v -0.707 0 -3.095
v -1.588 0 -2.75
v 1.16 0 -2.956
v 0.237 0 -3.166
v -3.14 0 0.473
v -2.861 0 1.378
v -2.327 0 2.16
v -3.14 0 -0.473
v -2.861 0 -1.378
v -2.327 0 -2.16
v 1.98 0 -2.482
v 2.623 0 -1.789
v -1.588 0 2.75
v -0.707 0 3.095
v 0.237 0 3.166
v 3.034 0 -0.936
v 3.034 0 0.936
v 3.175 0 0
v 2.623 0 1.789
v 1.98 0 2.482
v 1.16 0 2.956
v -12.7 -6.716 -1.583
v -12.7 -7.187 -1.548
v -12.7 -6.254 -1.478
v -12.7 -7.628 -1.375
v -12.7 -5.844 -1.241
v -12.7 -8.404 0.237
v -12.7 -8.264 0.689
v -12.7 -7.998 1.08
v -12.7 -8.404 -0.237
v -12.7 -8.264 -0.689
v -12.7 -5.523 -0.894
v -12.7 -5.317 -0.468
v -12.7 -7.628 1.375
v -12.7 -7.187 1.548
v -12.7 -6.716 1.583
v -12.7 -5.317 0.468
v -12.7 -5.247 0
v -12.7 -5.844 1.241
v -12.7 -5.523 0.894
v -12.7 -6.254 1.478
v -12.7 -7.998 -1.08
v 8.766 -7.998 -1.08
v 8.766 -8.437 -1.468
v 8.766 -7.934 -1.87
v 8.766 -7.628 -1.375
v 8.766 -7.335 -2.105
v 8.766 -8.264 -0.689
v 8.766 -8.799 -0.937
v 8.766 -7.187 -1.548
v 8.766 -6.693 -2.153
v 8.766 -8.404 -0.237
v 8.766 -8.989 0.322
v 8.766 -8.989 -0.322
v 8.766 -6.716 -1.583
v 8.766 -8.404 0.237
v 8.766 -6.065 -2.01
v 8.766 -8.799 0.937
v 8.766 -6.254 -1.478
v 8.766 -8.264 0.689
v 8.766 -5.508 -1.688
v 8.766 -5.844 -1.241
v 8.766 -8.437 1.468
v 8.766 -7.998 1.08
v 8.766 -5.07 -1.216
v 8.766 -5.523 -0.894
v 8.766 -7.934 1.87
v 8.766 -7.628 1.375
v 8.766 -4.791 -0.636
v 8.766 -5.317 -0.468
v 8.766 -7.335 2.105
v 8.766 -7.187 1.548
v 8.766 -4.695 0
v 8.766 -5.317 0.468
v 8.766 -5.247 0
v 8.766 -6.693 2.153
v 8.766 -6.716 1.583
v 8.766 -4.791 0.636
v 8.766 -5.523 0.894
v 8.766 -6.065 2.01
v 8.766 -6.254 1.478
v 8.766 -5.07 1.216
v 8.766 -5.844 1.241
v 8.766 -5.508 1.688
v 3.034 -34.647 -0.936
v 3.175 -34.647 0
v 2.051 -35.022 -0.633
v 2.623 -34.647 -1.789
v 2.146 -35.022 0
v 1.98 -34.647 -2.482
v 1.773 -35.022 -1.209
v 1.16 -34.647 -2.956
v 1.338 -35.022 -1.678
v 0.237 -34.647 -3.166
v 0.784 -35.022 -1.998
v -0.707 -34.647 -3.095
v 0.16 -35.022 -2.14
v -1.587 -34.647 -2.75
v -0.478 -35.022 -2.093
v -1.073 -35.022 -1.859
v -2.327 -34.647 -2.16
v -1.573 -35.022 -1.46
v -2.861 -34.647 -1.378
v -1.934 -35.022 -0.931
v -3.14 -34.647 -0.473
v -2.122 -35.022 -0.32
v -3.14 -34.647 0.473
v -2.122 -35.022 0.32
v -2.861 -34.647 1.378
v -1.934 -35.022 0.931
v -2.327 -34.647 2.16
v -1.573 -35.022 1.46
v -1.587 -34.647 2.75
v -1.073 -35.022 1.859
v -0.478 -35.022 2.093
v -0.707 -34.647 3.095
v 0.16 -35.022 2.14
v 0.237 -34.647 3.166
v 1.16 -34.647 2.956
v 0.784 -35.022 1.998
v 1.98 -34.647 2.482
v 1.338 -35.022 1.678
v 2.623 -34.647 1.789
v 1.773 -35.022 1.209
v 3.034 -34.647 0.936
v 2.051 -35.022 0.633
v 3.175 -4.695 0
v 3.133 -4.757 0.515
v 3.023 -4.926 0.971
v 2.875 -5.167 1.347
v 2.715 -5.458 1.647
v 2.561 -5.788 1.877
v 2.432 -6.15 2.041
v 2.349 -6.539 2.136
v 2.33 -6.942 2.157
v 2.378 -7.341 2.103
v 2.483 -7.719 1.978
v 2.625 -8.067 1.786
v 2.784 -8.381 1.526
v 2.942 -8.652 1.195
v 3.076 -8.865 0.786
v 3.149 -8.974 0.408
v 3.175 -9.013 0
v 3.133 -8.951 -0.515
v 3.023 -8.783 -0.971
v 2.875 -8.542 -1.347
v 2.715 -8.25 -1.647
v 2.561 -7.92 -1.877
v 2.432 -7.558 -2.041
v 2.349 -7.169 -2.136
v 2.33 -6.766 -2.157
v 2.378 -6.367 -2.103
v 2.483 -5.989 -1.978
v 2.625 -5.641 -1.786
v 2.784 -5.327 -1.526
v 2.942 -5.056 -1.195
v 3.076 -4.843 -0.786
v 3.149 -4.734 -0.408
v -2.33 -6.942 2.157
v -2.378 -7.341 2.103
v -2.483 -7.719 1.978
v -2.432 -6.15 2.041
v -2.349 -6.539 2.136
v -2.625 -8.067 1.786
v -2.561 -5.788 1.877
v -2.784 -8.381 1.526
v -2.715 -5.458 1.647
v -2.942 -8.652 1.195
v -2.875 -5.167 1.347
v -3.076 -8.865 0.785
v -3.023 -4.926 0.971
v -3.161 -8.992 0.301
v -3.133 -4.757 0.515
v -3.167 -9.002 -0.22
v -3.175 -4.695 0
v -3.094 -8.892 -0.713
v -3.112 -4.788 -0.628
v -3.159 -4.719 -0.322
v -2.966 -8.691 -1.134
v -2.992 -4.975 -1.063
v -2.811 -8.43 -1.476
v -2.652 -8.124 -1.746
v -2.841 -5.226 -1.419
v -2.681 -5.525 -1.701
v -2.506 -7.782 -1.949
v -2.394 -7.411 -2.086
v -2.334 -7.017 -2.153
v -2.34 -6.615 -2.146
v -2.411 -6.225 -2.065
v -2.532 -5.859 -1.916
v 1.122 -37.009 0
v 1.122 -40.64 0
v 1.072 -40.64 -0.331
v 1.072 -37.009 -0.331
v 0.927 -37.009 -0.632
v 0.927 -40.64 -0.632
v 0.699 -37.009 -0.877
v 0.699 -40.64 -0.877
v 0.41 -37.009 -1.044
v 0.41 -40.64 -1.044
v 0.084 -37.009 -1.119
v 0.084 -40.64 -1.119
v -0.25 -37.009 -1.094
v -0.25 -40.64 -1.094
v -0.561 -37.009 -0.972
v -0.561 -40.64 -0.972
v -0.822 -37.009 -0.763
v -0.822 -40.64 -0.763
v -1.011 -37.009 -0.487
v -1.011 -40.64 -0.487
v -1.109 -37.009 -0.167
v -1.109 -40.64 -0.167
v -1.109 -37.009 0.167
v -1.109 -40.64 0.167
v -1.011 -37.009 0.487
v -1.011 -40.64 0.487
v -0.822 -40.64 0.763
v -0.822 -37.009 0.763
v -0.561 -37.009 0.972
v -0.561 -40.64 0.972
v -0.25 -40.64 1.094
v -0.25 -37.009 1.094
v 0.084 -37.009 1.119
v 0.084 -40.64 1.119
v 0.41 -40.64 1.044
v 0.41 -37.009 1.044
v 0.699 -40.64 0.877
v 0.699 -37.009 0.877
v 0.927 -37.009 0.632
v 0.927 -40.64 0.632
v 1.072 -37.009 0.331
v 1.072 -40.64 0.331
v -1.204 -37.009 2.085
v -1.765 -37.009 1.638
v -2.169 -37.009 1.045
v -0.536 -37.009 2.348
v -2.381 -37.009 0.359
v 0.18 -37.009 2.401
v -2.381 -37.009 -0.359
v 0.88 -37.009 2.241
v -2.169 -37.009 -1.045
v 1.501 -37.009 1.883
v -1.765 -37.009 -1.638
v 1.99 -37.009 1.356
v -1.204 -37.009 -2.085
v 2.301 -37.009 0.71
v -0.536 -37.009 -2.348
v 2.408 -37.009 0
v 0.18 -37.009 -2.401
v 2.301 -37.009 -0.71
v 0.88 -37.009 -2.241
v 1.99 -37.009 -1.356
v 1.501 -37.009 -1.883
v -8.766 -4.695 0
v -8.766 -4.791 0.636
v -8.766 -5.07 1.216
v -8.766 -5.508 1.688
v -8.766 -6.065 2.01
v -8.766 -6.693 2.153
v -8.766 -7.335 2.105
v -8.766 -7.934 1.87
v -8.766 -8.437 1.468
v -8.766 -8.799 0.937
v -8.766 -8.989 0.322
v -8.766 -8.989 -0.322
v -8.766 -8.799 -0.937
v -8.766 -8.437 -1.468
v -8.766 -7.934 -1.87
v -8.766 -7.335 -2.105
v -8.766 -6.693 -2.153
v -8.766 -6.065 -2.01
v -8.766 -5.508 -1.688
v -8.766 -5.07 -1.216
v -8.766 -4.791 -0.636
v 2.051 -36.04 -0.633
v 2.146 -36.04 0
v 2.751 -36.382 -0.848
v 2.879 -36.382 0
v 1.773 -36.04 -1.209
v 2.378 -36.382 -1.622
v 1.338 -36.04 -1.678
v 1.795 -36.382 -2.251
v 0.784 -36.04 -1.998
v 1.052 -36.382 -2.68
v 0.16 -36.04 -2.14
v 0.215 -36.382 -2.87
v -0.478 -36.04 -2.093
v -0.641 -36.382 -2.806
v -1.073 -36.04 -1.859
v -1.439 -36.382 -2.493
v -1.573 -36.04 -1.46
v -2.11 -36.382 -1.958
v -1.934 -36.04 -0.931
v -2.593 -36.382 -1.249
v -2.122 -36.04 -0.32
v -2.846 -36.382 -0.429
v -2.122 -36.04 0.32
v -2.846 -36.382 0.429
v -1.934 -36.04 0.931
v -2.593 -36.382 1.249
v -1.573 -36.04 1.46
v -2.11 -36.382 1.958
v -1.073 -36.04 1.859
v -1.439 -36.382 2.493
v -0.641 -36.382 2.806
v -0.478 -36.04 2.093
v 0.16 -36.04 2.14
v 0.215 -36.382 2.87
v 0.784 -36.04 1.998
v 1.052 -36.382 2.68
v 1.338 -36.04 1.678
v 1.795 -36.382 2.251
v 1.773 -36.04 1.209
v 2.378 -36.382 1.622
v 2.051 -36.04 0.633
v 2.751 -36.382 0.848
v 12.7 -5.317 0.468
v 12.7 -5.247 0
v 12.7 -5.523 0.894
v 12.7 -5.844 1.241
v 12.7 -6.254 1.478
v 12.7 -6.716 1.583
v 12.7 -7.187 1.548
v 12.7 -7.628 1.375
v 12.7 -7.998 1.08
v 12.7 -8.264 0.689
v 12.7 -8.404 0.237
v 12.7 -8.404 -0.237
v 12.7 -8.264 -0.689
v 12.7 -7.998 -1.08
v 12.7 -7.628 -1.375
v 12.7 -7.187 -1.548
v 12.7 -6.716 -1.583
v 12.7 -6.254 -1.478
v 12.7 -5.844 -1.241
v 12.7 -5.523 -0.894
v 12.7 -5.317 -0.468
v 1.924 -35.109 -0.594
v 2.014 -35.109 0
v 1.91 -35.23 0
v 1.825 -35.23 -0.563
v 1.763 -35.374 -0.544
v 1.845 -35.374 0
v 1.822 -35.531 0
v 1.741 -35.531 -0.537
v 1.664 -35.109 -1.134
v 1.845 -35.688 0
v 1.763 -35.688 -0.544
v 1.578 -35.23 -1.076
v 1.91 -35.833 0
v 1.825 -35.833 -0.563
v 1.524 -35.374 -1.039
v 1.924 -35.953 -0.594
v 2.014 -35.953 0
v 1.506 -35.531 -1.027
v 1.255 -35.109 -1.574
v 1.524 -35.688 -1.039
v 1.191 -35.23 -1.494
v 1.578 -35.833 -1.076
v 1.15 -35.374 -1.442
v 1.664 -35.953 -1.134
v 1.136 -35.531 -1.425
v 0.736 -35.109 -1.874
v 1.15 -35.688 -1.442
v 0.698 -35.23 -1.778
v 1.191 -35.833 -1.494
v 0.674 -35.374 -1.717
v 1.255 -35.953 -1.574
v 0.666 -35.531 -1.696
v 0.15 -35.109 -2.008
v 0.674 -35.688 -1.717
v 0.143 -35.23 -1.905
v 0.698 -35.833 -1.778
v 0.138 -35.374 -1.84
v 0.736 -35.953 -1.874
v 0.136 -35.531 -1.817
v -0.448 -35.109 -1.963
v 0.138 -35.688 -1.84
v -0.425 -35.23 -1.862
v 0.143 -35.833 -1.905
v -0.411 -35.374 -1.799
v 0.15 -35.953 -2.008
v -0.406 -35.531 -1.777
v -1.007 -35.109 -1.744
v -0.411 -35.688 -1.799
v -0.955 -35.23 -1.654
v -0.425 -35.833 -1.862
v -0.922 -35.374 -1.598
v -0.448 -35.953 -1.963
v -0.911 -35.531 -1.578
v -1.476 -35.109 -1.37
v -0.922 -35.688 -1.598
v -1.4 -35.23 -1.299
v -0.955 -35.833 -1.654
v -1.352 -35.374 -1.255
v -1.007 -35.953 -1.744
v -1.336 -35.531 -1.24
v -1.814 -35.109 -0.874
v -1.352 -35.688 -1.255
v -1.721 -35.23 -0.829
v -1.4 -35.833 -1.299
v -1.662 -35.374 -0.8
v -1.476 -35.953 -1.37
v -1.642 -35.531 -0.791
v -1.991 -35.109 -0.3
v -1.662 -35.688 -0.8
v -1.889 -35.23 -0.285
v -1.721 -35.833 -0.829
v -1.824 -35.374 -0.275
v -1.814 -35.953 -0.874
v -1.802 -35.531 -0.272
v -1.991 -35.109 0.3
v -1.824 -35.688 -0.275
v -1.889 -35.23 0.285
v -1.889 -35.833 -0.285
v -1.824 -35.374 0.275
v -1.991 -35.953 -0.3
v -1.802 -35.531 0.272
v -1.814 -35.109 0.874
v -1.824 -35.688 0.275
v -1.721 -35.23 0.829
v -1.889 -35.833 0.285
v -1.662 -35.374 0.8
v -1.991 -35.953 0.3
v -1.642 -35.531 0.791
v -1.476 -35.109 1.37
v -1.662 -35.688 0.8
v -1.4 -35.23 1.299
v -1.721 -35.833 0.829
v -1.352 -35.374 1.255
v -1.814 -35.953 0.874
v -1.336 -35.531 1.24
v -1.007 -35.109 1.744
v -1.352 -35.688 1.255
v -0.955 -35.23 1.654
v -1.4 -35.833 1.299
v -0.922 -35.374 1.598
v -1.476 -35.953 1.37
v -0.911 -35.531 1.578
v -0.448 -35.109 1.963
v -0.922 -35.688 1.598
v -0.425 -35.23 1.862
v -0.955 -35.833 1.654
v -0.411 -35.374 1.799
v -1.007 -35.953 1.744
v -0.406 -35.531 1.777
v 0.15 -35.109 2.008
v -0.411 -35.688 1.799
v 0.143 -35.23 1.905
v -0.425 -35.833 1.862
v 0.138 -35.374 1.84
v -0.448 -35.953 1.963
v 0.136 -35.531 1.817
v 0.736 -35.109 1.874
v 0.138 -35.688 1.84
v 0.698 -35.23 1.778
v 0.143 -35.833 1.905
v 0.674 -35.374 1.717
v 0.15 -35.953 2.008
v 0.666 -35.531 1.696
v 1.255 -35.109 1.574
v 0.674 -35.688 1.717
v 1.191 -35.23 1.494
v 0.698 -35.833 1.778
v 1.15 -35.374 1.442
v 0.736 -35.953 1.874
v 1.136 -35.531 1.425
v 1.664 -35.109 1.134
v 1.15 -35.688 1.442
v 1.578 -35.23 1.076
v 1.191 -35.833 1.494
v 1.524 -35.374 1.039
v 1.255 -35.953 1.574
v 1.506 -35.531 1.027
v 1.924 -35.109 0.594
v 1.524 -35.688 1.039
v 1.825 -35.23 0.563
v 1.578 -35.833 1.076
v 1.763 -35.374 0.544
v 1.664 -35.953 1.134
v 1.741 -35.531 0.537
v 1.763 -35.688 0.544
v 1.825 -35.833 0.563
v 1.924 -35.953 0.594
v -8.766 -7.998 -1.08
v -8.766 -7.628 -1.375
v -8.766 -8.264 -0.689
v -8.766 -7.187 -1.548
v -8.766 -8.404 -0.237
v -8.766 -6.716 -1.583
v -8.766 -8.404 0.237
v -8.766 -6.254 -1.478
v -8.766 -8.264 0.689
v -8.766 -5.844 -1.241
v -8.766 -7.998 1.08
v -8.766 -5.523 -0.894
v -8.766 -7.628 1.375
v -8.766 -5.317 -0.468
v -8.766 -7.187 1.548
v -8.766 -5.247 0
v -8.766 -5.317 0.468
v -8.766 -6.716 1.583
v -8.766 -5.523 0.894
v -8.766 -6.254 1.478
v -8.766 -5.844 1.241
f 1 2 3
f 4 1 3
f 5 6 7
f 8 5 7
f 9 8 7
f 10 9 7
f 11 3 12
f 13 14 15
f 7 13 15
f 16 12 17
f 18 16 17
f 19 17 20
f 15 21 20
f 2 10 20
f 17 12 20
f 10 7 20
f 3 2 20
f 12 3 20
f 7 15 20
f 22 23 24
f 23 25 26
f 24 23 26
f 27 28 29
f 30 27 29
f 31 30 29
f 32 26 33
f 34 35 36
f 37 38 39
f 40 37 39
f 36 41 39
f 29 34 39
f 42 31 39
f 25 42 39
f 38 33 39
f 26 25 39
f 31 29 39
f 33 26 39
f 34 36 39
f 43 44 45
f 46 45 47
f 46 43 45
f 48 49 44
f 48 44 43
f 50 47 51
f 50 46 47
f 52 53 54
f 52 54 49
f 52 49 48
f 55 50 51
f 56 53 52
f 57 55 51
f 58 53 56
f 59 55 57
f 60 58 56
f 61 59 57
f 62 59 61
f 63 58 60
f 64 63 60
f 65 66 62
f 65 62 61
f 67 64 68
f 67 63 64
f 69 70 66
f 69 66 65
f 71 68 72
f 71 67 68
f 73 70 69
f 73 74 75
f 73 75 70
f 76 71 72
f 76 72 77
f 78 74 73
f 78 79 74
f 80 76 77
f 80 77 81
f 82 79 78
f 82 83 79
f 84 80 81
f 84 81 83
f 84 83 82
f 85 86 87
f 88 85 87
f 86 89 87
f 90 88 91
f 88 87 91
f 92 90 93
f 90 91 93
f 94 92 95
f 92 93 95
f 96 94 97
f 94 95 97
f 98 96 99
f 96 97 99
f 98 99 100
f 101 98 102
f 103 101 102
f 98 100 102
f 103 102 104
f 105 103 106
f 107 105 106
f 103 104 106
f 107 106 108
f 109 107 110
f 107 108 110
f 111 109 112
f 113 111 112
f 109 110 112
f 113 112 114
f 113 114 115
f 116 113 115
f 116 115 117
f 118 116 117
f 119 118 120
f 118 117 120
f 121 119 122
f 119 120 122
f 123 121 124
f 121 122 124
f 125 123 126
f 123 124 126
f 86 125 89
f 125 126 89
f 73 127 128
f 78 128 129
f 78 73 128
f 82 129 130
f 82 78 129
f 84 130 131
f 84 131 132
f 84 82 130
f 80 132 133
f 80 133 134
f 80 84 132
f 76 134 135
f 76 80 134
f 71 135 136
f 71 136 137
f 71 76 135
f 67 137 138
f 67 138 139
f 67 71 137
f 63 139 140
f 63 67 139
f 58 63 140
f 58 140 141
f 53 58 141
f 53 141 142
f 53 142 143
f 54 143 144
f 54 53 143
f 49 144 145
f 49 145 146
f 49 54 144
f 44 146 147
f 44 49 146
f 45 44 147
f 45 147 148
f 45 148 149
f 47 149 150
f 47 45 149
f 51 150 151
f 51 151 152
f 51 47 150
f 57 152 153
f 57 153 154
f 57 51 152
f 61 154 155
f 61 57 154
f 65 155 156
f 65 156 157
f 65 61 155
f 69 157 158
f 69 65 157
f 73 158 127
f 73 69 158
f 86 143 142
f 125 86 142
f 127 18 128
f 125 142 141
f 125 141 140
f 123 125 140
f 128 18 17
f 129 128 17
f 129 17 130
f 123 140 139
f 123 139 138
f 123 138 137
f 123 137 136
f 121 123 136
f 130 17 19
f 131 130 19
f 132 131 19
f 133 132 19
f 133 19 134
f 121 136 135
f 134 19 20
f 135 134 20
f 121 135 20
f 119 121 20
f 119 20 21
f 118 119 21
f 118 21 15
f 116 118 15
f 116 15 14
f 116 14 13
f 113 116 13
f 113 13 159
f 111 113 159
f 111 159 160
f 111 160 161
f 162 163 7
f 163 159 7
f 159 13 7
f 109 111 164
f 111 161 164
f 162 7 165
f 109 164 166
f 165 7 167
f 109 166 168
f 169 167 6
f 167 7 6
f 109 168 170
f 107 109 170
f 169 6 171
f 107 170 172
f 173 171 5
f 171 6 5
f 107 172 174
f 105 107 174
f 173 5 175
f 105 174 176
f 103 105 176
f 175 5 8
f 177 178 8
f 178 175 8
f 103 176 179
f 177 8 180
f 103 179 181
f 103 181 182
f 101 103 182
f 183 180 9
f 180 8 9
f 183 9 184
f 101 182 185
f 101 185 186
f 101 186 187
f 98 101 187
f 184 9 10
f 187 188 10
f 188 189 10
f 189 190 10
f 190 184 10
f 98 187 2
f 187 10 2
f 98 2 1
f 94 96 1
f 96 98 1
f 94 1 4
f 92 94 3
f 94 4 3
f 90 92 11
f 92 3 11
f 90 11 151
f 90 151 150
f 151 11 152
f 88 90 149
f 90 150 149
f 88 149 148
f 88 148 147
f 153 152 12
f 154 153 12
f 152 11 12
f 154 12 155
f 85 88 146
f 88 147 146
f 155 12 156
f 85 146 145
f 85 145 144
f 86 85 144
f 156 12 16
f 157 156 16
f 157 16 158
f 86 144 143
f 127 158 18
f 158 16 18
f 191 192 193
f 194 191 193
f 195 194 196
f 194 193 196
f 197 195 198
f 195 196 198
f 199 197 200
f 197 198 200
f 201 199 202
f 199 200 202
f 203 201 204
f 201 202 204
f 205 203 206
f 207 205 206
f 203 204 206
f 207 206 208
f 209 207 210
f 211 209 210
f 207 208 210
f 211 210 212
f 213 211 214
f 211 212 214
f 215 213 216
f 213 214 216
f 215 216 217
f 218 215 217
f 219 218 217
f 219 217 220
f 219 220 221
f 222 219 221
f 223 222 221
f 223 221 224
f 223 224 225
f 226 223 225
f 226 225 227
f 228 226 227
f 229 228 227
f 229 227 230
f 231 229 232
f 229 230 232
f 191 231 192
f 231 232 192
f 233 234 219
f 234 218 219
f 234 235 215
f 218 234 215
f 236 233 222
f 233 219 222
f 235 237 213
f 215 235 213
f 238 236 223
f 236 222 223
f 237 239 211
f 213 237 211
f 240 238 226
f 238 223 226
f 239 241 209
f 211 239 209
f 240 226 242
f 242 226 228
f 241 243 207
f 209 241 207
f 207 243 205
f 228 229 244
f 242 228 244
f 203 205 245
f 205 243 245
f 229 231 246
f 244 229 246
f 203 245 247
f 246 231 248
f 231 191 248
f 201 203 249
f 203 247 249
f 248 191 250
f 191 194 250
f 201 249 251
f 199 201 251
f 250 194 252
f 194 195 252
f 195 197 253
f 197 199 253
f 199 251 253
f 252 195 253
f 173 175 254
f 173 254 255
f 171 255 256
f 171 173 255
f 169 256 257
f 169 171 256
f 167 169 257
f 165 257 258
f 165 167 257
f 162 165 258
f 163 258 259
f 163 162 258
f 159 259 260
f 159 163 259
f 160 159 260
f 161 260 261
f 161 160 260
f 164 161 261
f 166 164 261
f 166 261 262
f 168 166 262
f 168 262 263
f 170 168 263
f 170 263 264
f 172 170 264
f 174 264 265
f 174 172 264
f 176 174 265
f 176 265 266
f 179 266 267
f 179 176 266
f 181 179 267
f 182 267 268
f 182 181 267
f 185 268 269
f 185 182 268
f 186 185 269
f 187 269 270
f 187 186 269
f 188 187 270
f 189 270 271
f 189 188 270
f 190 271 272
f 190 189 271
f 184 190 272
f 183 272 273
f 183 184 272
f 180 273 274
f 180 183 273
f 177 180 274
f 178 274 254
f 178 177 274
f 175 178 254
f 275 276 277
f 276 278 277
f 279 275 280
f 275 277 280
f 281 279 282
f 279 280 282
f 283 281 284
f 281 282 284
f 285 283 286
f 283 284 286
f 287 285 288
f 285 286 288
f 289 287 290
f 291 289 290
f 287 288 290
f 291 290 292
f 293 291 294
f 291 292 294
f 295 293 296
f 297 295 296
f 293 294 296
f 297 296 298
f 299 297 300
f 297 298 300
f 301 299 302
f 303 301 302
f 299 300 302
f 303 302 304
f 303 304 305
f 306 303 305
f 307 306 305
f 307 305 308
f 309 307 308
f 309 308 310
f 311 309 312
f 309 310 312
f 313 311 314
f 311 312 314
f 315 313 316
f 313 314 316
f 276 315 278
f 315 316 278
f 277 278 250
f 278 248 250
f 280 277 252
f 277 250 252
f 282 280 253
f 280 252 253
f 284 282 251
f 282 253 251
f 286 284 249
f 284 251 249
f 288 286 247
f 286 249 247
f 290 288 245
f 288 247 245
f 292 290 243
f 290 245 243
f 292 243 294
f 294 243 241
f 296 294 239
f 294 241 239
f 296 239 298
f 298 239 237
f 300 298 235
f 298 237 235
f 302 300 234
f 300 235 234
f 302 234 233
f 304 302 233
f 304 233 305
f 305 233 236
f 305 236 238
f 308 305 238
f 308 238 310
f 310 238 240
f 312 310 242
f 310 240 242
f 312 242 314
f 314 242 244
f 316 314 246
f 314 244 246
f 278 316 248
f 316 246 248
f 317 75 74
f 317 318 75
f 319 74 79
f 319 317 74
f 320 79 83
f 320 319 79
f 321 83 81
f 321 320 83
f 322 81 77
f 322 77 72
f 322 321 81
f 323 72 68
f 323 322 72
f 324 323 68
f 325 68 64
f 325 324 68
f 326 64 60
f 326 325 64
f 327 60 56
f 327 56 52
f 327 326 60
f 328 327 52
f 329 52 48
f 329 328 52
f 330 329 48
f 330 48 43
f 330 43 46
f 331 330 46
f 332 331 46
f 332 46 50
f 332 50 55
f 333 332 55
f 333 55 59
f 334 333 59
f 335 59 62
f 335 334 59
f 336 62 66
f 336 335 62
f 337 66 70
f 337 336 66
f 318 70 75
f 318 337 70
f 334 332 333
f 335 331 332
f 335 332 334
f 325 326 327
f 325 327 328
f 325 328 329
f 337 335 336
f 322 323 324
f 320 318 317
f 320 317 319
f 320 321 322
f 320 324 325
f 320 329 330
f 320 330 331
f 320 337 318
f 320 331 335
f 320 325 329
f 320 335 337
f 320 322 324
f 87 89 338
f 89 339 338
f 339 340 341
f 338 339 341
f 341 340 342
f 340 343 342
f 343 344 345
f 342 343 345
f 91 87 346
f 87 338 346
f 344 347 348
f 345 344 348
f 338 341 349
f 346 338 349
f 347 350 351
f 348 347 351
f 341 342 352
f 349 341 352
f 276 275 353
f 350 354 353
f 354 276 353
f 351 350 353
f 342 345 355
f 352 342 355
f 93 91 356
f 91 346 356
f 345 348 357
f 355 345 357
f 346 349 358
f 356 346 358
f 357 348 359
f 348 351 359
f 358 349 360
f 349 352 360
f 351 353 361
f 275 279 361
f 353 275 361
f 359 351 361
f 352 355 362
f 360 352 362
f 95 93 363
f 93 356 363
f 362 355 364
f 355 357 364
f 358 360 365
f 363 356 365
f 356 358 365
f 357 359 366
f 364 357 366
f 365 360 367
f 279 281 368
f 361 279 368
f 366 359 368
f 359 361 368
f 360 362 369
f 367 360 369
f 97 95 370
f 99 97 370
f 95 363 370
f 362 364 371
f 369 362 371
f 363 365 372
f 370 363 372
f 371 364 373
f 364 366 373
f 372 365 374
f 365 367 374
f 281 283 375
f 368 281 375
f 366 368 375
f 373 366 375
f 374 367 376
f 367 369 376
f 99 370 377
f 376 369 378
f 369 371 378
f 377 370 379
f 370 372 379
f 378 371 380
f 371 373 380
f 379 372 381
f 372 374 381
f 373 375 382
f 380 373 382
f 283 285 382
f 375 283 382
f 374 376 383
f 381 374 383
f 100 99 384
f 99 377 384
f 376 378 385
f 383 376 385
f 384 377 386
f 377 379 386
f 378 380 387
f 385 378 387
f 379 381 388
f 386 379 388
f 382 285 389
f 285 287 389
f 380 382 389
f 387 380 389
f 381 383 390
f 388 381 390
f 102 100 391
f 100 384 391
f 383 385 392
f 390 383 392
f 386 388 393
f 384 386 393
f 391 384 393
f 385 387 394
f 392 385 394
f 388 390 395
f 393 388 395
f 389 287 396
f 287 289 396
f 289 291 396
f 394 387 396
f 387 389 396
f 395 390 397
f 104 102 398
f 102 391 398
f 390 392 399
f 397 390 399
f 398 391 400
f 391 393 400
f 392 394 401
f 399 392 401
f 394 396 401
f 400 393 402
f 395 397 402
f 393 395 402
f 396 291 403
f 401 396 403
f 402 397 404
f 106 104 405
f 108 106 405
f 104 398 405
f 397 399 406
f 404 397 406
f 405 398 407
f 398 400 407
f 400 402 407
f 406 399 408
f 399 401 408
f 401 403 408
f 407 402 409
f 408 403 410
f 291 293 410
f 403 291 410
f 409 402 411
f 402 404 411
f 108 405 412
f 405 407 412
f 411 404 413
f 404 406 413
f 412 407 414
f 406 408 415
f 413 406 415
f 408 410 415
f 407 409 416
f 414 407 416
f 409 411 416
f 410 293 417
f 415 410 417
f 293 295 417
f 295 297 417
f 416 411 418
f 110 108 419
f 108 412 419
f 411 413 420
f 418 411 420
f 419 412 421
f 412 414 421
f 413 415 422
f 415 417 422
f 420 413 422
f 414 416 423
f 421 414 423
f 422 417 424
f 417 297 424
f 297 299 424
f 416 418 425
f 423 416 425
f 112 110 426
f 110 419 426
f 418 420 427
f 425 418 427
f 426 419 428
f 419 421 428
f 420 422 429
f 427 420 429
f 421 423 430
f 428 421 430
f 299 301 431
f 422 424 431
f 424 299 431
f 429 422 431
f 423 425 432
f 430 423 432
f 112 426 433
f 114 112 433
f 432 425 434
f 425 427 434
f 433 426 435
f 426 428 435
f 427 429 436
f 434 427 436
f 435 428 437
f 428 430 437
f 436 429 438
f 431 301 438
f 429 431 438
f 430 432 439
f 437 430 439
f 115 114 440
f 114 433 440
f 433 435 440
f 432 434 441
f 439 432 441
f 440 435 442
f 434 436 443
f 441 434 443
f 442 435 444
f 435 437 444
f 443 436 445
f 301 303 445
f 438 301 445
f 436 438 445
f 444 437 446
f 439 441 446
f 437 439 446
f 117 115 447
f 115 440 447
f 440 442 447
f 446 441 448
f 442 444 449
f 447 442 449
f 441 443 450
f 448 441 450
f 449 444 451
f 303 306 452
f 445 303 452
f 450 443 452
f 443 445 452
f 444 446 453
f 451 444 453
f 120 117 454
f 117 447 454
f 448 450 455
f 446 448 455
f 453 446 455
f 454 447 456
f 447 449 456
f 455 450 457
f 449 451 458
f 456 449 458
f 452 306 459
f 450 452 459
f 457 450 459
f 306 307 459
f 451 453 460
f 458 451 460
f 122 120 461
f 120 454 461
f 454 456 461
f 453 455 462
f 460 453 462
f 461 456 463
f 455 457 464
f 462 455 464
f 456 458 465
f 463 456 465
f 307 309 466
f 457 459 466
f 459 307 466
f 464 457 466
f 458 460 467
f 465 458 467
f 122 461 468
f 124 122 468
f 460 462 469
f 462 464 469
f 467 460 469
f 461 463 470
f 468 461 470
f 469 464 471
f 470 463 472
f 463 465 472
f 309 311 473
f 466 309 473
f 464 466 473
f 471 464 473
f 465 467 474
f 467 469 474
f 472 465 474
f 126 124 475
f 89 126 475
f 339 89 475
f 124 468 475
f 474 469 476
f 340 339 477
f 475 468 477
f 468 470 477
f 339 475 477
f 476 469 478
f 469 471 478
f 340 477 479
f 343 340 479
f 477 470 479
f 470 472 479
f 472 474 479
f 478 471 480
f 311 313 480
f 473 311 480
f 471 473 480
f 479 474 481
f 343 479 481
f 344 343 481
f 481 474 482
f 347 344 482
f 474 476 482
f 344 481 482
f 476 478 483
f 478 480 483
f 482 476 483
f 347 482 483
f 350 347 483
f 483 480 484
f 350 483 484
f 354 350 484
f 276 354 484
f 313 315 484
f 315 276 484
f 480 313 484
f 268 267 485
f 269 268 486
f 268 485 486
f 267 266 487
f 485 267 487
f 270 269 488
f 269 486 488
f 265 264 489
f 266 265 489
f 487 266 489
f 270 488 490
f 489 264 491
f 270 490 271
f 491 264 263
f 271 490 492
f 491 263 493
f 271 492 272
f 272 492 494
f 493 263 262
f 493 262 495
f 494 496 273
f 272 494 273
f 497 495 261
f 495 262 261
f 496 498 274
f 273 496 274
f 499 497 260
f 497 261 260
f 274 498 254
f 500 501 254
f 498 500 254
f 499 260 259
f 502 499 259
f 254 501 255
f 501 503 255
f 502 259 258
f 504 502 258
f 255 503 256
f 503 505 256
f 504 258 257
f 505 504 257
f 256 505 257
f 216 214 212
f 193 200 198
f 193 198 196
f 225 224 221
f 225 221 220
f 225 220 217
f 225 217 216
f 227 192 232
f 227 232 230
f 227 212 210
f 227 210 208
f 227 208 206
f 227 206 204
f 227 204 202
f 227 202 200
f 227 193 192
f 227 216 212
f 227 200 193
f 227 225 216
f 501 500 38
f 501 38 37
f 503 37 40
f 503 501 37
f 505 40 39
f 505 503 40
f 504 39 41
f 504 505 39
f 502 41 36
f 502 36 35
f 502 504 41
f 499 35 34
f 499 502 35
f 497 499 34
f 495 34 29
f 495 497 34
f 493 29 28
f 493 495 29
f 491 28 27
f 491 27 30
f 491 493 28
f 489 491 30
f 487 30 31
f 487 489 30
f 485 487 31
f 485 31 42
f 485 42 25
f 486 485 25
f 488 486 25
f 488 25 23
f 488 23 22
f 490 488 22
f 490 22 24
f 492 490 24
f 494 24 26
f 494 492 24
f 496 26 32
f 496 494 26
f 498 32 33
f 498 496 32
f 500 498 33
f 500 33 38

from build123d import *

# Parameters (mm, degrees)
F0_R     = 3.175
F1_DEPTH = 40.64
F4_R     = 2.159
F5_DEPTH = 8.765794
F6_R     = 1.5875
F7_DEPTH = 12.7


with BuildPart() as f1:
    # F0 (on Front) → F1 (new body)
    with BuildSketch(Plane.XZ):
        Circle(F0_R)
    extrude(amount=F1_DEPTH)

    # F2 (on Top) → F3 (revolve, cut)
    with BuildSketch(Plane.XY):
        with BuildLine():
            Line((2.4847375462, -48.6786328256), (2.4847375462, -48.4504029155))
            Line((2.4847375462, -48.4504029155), (3.6910393974, -48.4504029155))
            Line((3.6910393974, -48.4504029155), (3.6910393974, -34.4593115151))
            Line((3.6910393974, -34.4593115151), (2.1464712918, -35.0223816931))
            ThreePointArc((2.1464712918, -35.0223816931), (1.8223472959, -35.5313199787), (2.1464712918, -36.0402582643))
            Line((2.1464712918, -36.0402582643), (2.8785056202, -36.3818742335))
            Line((2.8785056202, -36.3818742335), (2.4079122813, -37.009332329))
            Line((2.4079122813, -37.009332329), (1.121821173, -37.009332329))
            Line((1.121821173, -37.009332329), (1.121821173, -46.976801008))
            Line((1.121821173, -46.976801008), (2.4847375462, -48.6786328256))
        make_face()
    revolve(axis=Axis((0, -45.1813880354, 0), (0, 1, 0)), mode=Mode.SUBTRACT)

    # F4 (on Right) → F5 (join, symmetric)
    with BuildSketch(Plane.YZ):
        with Locations((-6.8540938167, 0)):
            Circle(F4_R)
    extrude(amount=F5_DEPTH, both=True)

    # F6 (on Right) → F7 (join, symmetric)
    with BuildSketch(Plane.YZ):
        with Locations((-6.8342058709, 0)):
            Circle(F6_R)
    extrude(amount=F7_DEPTH, both=True)


solid = f1.part
